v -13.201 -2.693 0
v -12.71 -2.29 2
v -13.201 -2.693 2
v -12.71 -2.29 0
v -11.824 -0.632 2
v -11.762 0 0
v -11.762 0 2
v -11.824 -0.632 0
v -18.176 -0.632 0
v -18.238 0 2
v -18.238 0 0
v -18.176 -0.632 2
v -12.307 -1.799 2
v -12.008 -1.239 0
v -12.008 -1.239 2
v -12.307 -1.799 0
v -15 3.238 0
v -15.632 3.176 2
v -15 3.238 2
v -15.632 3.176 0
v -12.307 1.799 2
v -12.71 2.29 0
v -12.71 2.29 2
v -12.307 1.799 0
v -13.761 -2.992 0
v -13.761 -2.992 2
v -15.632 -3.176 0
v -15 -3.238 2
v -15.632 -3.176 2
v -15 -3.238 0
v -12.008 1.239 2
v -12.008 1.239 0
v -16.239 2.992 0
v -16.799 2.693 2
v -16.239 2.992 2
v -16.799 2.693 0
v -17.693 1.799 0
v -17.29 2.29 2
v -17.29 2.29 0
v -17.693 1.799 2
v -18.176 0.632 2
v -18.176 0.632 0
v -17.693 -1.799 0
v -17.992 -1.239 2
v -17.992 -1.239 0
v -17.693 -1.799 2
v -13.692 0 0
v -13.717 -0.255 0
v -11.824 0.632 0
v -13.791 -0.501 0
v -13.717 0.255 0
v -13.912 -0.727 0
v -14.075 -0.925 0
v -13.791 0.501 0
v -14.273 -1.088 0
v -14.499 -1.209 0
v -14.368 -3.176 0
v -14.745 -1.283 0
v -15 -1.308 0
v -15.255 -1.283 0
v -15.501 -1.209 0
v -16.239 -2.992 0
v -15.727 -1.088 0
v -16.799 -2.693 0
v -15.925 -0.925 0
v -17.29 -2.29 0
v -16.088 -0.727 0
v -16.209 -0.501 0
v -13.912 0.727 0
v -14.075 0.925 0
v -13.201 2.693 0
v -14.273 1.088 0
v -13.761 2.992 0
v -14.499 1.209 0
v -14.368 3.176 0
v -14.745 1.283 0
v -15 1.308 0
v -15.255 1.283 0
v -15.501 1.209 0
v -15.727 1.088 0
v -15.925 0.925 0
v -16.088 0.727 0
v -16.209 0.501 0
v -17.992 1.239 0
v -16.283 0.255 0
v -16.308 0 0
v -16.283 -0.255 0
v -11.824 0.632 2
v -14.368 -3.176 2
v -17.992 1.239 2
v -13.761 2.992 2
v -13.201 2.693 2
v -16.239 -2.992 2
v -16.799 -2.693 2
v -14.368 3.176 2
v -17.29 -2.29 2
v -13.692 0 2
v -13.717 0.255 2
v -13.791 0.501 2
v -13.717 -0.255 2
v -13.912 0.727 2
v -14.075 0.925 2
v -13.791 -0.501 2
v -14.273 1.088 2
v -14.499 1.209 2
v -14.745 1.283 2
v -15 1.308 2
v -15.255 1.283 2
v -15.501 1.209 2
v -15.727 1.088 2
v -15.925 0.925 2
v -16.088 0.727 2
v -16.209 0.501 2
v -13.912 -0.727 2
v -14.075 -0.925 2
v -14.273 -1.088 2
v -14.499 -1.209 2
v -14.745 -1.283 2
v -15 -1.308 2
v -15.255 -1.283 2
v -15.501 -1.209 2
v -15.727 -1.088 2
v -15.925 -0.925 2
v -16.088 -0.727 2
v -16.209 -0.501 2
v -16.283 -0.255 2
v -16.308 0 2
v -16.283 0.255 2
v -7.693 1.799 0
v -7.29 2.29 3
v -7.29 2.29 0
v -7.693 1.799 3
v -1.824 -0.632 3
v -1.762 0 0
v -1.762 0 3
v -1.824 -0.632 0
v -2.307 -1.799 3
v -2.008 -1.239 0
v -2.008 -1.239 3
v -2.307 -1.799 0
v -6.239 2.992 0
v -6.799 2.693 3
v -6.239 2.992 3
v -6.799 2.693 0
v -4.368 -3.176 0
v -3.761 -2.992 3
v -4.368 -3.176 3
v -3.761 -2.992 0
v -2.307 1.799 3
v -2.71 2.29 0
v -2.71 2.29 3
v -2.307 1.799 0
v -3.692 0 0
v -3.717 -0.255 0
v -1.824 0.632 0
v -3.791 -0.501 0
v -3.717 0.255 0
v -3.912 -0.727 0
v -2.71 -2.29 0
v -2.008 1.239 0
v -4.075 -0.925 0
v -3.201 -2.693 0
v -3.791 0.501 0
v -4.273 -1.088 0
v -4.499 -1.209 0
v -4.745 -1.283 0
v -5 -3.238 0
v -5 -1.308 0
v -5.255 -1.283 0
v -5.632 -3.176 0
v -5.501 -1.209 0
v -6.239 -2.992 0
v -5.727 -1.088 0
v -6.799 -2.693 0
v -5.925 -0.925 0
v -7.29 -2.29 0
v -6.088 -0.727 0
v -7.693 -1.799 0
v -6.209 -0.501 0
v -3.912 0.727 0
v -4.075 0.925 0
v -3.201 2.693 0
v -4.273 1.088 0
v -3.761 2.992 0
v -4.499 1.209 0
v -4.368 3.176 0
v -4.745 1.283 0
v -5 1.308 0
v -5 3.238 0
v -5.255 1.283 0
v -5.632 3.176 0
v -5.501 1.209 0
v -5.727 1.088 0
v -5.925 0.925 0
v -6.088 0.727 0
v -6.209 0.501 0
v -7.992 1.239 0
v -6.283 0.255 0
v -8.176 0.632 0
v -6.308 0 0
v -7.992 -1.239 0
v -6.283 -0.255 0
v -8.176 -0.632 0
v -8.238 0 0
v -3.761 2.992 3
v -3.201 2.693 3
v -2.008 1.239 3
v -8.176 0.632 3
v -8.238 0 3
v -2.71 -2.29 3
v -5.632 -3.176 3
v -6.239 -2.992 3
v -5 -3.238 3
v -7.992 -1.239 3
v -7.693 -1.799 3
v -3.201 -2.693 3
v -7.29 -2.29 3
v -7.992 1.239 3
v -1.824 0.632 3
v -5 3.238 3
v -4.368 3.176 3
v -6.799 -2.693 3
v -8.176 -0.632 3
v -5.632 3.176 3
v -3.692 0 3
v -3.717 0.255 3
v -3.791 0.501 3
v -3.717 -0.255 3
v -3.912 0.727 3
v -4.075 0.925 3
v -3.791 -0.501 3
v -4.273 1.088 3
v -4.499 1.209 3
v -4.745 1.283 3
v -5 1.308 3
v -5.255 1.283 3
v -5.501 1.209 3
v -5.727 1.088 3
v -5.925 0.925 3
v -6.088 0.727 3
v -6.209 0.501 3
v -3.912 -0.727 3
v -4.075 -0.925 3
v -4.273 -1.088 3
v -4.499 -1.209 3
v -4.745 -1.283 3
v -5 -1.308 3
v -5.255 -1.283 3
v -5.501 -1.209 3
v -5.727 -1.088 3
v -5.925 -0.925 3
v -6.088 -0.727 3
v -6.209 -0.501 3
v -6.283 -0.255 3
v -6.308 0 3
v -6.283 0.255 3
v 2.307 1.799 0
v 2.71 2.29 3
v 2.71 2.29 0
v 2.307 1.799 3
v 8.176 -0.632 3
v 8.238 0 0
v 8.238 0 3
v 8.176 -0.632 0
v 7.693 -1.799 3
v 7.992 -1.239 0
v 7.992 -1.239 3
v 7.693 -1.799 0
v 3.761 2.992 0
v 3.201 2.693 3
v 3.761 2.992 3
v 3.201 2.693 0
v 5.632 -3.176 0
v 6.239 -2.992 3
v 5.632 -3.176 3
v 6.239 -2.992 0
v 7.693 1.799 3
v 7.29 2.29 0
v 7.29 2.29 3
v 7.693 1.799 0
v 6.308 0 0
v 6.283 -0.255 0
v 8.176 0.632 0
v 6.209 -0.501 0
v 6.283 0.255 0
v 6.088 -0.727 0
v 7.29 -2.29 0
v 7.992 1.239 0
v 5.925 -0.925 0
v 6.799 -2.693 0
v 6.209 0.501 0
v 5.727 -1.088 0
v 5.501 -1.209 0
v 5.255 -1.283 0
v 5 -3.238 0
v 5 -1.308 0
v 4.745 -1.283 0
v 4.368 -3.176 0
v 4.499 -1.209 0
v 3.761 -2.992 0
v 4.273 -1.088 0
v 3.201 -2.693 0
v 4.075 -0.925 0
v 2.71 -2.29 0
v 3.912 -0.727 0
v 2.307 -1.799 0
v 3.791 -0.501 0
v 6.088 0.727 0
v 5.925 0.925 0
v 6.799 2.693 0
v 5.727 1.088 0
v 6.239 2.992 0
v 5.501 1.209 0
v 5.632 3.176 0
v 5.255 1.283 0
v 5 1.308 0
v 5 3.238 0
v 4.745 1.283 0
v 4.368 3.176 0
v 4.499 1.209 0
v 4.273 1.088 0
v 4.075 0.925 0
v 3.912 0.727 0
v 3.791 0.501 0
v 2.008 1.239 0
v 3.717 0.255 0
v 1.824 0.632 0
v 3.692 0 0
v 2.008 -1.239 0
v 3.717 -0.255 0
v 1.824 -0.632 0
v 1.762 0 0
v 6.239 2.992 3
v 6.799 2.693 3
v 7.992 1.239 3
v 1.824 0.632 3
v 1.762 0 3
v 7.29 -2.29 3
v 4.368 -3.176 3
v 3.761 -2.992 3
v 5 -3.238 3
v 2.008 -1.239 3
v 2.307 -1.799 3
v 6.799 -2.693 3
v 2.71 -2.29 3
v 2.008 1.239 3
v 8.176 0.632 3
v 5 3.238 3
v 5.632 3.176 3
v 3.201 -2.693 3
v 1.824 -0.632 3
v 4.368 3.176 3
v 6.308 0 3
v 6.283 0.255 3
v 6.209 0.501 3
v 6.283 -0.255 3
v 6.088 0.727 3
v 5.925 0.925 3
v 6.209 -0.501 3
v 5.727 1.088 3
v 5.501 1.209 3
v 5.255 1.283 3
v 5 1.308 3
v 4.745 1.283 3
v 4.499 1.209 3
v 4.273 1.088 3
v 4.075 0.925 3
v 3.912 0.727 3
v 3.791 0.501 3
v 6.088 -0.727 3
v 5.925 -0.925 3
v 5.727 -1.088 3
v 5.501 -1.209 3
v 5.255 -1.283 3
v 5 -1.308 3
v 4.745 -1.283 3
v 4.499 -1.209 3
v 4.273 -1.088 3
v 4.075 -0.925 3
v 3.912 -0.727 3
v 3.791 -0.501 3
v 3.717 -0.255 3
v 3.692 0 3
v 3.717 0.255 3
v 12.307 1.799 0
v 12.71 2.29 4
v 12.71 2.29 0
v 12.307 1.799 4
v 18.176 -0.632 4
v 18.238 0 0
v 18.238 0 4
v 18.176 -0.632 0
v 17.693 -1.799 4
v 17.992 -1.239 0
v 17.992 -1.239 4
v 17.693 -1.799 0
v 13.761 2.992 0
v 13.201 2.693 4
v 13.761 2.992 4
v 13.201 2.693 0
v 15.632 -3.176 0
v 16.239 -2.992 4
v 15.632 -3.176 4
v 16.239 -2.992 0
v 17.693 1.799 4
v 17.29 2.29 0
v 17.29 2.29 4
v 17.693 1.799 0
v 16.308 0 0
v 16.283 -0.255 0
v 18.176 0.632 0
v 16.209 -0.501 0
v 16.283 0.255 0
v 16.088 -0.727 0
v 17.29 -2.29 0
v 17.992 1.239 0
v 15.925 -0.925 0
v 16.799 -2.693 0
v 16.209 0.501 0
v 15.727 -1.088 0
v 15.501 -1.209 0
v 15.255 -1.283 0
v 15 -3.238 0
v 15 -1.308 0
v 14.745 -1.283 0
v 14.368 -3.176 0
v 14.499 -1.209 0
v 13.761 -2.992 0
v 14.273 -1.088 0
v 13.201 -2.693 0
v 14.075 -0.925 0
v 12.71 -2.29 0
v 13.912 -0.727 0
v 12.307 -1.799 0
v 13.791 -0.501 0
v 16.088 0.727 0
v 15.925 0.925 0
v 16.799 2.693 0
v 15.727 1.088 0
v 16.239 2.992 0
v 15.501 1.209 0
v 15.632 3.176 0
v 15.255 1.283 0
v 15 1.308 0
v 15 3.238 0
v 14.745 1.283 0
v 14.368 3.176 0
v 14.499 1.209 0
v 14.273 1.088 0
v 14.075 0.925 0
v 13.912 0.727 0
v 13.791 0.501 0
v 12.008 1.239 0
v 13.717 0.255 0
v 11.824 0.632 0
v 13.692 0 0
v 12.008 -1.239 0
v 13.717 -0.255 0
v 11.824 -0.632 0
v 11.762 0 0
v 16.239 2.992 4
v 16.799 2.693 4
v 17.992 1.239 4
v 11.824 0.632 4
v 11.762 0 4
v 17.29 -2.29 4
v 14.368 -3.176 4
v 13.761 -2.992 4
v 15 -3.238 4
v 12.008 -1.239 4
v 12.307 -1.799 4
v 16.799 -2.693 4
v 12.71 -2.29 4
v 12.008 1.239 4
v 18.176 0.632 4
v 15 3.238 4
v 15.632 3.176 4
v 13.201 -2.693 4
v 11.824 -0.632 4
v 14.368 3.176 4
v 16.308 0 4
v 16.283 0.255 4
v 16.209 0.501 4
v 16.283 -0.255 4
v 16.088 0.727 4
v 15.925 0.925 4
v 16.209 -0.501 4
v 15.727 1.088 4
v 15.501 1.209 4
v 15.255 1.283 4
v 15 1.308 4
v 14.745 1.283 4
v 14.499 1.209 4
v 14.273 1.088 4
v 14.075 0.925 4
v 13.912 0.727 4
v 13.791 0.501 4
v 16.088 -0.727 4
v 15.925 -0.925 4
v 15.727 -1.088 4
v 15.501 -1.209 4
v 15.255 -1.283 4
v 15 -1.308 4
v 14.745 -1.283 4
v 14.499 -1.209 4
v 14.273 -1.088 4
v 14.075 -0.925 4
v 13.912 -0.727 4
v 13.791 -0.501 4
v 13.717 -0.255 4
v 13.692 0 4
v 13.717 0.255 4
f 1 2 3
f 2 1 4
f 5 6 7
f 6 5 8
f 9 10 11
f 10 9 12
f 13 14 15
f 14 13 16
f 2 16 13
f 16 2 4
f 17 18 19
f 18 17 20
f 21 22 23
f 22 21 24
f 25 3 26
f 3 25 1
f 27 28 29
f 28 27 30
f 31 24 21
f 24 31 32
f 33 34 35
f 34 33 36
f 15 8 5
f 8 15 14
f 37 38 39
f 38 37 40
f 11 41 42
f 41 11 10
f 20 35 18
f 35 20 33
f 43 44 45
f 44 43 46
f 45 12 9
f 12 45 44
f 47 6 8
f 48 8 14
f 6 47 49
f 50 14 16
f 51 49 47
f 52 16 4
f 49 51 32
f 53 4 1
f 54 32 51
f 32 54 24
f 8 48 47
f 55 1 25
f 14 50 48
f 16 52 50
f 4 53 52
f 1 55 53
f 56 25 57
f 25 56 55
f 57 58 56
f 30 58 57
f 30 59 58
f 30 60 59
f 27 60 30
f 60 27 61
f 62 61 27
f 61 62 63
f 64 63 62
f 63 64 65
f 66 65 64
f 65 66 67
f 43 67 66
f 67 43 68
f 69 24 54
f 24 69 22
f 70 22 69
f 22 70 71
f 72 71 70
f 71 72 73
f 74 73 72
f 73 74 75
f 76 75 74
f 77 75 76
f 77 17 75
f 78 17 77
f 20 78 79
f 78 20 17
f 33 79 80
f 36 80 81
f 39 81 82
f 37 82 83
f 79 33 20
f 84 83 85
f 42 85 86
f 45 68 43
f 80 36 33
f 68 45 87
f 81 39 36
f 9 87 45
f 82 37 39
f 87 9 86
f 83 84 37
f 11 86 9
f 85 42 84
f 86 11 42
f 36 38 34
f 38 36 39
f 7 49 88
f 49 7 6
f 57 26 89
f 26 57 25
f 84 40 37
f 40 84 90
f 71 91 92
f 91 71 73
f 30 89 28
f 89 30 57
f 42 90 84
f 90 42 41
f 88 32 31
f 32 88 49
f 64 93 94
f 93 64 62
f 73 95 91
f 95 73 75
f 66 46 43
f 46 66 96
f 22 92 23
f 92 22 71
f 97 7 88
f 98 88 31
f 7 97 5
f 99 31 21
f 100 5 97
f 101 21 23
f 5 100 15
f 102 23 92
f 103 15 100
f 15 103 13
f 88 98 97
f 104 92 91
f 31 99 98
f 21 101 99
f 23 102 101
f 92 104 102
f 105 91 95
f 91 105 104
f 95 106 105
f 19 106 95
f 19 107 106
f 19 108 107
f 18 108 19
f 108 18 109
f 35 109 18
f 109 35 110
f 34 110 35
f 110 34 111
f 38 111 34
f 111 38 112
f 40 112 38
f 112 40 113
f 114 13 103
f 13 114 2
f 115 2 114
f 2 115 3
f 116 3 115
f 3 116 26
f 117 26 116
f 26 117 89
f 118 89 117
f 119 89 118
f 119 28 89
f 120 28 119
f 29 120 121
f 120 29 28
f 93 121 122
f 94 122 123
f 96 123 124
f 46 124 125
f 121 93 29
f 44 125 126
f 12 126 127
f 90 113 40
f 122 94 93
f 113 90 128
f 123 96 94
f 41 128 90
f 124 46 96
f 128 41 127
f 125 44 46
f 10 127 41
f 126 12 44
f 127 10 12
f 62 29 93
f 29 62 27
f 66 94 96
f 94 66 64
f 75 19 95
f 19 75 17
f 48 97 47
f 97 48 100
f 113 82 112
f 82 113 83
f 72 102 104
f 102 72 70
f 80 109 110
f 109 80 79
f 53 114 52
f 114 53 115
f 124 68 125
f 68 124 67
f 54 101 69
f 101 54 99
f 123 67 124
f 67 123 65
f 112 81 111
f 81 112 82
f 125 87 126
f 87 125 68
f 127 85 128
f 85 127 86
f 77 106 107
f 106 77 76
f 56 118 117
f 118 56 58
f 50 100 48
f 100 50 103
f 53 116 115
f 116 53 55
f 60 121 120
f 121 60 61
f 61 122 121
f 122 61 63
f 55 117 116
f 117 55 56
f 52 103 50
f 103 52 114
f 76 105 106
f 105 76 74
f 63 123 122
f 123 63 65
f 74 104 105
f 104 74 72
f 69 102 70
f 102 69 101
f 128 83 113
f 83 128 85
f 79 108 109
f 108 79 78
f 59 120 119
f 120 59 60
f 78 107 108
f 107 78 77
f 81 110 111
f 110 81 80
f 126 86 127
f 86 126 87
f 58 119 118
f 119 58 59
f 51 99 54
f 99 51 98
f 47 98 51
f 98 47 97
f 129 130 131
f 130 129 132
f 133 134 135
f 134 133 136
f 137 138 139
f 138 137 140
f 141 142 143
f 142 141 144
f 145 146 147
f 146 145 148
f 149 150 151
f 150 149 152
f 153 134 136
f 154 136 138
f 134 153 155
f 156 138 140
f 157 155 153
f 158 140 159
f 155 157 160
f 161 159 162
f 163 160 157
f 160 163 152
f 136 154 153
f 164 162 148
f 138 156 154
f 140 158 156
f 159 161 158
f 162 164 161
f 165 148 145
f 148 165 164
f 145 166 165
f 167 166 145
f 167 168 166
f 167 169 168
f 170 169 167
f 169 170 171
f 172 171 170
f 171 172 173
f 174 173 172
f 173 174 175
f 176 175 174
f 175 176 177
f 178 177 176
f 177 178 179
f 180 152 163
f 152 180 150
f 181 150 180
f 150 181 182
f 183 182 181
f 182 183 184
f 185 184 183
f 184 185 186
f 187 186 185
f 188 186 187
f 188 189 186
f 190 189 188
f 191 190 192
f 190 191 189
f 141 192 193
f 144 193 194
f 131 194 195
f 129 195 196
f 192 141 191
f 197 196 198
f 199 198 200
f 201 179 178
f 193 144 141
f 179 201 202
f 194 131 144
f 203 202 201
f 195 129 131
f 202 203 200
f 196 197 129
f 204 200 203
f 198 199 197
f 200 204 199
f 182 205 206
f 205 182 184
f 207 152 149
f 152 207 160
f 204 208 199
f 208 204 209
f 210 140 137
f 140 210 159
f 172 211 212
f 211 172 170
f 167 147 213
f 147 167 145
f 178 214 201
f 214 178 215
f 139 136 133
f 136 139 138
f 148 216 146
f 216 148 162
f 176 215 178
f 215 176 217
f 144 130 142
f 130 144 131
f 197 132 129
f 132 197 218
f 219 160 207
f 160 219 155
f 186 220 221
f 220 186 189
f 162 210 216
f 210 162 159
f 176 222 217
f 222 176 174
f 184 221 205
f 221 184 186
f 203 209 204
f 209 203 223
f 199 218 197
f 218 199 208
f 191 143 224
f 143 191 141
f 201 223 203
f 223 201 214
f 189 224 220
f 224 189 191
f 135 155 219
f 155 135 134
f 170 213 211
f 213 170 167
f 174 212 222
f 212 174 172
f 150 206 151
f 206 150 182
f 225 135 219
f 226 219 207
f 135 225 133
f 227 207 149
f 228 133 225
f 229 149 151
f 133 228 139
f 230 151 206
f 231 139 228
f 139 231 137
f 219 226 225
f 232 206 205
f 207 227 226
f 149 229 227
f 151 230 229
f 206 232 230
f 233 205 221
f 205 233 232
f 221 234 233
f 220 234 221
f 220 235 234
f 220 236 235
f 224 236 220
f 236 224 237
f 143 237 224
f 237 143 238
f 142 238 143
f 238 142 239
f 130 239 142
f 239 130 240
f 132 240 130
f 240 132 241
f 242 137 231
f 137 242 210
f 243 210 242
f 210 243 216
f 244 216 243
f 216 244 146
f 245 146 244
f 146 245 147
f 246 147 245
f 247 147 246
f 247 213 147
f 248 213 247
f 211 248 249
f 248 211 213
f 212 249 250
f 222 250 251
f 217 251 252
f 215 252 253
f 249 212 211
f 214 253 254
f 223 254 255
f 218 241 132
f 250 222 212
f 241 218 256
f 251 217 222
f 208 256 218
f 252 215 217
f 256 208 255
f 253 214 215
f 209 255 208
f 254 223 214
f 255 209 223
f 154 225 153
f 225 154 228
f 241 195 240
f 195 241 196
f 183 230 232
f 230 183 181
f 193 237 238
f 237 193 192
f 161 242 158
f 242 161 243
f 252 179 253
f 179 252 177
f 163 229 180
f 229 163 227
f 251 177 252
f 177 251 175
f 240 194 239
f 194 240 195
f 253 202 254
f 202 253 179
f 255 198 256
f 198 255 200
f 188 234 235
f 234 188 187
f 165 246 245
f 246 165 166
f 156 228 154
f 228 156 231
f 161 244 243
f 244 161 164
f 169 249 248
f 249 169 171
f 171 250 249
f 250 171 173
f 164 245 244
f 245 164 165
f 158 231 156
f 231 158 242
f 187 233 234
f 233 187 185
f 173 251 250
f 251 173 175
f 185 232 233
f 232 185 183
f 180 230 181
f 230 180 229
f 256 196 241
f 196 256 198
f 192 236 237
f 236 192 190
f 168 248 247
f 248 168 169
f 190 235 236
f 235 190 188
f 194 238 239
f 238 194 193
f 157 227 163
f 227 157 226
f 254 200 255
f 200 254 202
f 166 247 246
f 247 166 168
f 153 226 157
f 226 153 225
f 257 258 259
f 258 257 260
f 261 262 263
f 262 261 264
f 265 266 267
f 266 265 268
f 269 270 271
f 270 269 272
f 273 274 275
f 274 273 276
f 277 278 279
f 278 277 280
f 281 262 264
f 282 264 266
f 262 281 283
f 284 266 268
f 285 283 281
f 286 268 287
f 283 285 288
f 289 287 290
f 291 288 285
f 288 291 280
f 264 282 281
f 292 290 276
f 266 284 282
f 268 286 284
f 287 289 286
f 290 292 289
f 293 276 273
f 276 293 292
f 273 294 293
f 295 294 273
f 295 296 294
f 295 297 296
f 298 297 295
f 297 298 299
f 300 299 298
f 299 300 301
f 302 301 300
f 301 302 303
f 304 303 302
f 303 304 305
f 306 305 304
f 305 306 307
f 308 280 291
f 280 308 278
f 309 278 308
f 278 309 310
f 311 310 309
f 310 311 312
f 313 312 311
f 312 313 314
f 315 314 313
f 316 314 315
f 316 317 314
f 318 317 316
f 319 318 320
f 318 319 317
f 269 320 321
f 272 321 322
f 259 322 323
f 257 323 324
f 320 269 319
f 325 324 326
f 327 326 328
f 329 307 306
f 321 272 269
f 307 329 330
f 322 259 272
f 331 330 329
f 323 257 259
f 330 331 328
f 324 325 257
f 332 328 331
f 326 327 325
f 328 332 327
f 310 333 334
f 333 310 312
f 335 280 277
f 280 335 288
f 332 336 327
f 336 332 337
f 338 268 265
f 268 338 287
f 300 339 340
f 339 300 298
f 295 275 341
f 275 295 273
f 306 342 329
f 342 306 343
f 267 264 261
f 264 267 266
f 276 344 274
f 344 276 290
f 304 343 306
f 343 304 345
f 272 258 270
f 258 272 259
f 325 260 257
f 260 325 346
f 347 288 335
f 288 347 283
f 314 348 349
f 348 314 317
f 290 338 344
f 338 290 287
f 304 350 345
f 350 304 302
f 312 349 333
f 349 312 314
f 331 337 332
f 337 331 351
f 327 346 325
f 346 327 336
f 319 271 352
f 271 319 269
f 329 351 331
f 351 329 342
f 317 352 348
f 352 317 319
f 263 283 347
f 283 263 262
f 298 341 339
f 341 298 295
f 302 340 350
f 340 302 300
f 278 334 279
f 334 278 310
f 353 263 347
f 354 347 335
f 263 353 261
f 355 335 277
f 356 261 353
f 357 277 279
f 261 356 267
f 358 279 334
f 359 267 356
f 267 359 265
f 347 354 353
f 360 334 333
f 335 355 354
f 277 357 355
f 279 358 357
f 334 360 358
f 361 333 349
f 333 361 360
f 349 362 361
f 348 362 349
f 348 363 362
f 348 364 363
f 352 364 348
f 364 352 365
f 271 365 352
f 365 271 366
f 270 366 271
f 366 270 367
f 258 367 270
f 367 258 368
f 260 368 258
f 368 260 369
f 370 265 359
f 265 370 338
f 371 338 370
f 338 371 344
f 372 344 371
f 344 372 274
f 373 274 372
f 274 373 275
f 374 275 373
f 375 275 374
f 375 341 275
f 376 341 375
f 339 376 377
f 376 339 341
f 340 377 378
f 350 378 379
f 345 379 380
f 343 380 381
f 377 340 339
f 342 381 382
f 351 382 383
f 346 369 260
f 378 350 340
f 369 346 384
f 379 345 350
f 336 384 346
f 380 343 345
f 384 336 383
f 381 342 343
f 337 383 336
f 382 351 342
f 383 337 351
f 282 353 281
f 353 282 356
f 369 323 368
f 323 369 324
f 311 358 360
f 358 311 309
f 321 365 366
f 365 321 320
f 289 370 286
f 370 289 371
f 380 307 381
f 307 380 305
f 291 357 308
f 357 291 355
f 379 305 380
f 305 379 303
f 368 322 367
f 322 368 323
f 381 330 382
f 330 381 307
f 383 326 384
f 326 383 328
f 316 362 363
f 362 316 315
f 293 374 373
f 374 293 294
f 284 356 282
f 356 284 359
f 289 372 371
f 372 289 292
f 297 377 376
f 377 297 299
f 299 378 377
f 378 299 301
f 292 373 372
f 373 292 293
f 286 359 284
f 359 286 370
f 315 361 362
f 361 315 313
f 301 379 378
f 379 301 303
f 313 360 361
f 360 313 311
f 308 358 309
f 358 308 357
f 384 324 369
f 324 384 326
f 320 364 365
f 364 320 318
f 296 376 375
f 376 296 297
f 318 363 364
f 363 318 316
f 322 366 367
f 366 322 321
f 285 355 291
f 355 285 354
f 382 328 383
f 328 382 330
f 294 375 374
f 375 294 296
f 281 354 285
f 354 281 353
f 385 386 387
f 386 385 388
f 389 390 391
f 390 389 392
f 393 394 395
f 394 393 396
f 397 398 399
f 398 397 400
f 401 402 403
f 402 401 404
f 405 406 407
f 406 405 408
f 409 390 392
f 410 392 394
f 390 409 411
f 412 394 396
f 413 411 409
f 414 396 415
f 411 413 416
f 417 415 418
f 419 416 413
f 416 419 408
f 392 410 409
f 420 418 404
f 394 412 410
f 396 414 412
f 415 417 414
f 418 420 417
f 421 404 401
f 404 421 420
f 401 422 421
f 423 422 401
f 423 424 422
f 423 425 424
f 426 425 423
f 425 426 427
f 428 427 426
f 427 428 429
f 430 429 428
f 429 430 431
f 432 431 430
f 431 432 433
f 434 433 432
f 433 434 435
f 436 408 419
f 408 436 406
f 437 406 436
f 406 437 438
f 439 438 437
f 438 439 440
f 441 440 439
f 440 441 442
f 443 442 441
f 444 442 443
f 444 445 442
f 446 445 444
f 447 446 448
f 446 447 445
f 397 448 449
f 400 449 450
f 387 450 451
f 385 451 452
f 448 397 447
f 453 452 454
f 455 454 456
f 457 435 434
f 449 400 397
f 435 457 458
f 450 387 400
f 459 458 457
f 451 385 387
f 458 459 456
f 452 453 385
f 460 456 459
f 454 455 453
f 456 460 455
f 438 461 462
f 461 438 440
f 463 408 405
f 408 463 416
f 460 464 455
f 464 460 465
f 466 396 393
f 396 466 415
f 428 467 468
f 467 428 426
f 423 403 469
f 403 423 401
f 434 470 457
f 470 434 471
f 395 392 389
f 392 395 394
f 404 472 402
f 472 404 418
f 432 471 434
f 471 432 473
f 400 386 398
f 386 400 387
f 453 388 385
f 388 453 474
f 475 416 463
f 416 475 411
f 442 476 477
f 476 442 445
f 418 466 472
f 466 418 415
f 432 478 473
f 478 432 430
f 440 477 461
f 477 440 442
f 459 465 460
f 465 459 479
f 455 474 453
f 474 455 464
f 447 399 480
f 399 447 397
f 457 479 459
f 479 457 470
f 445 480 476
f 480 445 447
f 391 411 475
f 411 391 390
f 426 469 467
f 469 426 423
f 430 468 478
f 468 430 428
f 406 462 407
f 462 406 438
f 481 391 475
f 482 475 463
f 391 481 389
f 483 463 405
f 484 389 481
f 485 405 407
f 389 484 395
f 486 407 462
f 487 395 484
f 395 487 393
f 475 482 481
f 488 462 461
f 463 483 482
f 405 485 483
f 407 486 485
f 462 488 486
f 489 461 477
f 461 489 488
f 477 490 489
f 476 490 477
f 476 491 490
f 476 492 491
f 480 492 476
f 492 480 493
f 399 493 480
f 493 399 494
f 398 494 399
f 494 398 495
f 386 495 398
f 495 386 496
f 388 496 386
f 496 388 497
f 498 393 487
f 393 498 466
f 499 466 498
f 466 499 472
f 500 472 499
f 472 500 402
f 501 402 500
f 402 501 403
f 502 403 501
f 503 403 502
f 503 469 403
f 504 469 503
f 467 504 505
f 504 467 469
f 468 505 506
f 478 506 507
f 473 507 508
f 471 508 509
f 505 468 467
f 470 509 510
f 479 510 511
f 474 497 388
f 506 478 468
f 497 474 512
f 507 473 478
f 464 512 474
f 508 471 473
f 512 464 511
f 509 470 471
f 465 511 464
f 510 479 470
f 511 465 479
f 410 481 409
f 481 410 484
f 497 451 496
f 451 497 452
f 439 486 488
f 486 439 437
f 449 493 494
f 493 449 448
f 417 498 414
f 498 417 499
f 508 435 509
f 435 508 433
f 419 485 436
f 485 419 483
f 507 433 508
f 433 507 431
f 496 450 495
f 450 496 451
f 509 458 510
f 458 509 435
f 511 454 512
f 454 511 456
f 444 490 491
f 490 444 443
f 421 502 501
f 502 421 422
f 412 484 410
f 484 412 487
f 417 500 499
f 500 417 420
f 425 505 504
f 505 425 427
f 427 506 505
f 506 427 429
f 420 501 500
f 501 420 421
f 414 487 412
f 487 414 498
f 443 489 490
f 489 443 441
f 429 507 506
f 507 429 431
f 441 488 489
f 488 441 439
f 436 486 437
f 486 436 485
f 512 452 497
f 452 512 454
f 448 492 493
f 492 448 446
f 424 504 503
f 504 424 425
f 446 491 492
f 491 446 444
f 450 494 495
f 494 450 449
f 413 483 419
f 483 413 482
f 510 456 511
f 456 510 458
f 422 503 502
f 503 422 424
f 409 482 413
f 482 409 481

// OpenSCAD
// gear spacers

$sd = 1.01 * 2.54 * 1.02 / 2; // loose shaft radius

$whd=2.5 * 2.54 * 1.02 / 2; // 0.25" outer diameter

$fn=32;

color("blue")
  union()
  {
    translate([-15,0,0])
      difference()
      {
        linear_extrude(height=2)
          circle($whd);

        translate([0,0,-1])
          linear_extrude(height=6)
            circle($sd);
      }

    translate([-5,0,0])
      difference()
      {
        linear_extrude(height=3)
          circle($whd);

        translate([0,0,-1])
          linear_extrude(height=6)
            circle($sd);
      }

    translate([5,0,0])
      difference()
      {
        linear_extrude(height=3)
          circle($whd);

        translate([0,0,-1])
          linear_extrude(height=6)
            circle($sd);
      }

    translate([15,0,0])
      difference()
      {
        linear_extrude(height=4)
          circle($whd);

        translate([0,0,-1])
          linear_extrude(height=6)
            circle($sd);
      }
  }
      
